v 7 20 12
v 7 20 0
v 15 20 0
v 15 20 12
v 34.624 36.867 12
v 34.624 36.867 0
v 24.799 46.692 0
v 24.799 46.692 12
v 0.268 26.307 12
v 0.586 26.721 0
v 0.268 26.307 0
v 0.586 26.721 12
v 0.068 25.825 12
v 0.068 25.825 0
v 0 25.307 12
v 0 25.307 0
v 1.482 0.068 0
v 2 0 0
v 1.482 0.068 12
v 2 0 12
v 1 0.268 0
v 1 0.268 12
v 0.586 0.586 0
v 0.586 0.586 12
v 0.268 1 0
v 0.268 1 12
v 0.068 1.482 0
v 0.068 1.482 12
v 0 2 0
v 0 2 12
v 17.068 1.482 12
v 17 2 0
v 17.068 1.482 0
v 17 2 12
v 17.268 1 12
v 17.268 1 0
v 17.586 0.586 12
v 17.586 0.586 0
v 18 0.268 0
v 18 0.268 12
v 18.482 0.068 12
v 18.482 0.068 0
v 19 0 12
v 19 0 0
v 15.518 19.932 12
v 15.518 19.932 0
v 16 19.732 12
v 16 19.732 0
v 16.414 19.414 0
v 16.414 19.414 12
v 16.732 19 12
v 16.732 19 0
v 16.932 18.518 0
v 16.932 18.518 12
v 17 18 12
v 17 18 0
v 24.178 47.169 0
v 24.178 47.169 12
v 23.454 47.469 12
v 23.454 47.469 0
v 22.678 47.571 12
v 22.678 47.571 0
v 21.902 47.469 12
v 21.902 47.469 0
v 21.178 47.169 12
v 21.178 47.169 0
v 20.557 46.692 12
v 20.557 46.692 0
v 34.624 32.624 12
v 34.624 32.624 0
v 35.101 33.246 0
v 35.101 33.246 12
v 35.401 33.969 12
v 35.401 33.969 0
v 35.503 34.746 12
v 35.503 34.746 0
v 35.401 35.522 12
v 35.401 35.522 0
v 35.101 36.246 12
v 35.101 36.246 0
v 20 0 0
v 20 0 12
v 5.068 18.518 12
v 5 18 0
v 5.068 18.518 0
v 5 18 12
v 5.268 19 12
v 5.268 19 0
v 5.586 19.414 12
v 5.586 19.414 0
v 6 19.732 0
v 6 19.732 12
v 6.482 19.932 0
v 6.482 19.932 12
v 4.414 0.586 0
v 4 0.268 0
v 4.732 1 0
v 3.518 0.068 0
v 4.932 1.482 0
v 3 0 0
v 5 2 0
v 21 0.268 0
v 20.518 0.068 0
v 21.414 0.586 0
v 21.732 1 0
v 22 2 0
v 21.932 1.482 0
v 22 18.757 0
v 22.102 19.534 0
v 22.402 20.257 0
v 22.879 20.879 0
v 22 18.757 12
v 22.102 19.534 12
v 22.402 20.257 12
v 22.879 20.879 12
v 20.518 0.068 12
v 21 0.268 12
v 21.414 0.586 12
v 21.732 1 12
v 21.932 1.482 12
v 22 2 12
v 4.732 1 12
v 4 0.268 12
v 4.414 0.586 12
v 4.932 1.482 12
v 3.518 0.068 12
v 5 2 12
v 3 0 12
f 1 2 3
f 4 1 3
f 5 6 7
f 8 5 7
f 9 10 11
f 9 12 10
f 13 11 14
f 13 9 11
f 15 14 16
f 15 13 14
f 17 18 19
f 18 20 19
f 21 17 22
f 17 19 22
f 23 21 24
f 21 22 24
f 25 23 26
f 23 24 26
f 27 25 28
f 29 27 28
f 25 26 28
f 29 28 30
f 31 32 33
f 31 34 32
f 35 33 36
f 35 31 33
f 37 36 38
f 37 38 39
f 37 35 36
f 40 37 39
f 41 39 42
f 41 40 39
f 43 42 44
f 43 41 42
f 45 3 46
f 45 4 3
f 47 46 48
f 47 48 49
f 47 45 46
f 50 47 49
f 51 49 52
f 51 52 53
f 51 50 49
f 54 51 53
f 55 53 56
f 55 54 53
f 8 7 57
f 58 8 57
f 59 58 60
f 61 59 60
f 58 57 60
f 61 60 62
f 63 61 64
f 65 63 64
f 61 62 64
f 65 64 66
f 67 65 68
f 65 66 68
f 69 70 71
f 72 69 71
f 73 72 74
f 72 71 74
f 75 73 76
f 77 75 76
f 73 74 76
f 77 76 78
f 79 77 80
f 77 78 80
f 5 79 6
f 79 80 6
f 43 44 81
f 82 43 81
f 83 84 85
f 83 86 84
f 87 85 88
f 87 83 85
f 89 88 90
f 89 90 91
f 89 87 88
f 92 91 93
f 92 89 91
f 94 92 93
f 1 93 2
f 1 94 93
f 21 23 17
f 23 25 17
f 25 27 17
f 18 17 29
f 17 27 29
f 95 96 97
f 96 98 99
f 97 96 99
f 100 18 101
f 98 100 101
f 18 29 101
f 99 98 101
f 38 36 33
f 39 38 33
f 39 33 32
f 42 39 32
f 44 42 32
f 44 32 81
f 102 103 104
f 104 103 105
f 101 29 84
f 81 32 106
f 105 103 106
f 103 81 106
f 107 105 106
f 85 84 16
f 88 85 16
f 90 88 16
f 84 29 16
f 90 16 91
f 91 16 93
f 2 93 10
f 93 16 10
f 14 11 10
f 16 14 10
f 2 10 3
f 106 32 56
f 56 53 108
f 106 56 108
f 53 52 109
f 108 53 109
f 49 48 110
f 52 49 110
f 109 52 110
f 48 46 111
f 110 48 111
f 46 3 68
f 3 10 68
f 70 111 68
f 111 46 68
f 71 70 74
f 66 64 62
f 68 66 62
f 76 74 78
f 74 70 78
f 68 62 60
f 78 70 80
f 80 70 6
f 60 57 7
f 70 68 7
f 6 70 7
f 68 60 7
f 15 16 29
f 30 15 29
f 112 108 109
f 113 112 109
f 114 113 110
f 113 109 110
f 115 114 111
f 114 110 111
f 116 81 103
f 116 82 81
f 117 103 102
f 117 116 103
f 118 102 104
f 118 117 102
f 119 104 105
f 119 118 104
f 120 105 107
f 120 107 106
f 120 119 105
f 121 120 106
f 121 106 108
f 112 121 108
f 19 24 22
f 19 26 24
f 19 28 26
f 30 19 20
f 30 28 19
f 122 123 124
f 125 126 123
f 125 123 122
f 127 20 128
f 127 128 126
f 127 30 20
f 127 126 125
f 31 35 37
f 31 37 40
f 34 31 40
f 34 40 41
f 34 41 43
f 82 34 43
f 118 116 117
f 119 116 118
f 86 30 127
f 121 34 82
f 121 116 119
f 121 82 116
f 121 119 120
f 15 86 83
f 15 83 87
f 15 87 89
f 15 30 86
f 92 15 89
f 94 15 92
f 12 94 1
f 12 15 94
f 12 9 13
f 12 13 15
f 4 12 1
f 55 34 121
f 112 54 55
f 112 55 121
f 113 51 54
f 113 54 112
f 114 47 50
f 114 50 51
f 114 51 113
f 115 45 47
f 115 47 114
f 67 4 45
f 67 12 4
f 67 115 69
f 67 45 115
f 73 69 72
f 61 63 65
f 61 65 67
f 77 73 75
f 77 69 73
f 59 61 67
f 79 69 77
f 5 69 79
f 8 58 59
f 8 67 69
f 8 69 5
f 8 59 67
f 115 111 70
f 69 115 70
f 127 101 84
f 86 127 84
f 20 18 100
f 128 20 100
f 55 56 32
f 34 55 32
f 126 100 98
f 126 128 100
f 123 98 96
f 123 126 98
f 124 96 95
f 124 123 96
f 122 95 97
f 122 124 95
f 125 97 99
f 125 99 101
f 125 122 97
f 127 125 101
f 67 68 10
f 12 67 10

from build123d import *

# Parameters (mm, degrees)
EXTRUDE_1_DEPTH = 12
FILLET_1_R      = 2


with BuildPart() as part:
    # Эскиз1 → Бобышка-Вытянуть1 (new body)
    with BuildSketch(Plane.XY):
        with BuildLine():
            Line((0, 0), (5, 0))
            Line((5, 0), (5, 20))
            Line((5, 20), (17, 20))
            Line((17, 20), (17, 0))
            Line((17, 0), (22, 0))
            Line((22, 0), (22, 18.757359313))
            ThreePointArc((22, 18.757359313), (22.228361402, 19.90540961), (22.878679656, 20.878679656))
            Line((22.878679656, 20.878679656), (34.624442368, 32.624442368))
            ThreePointArc((34.624442368, 32.624442368), (35.503122025, 34.745762712), (34.624442368, 36.867083055))
            Line((34.624442368, 36.867083055), (24.799286445, 46.692238978))
            ThreePointArc((24.799286445, 46.692238978), (22.677966102, 47.570918635), (20.556645758, 46.692238978))
            Line((20.556645758, 46.692238978), (0, 26.13559322))
            Line((0, 26.13559322), (0, 0))
        make_face()
    extrude(amount=EXTRUDE_1_DEPTH)

    # Скругление1
    fillet_1_edges = [part.edges().sort_by_distance(p)[0] for p in [
        (0, 26.13559322, 6),
        (22, 0, 6),
        (17, 0, 6),
        (17, 20, 6),
        (5, 20, 6),
        (5, 0, 6),
        (0, 0, 6),
    ]]
    fillet(fillet_1_edges, radius=FILLET_1_R)


solid = part.part
